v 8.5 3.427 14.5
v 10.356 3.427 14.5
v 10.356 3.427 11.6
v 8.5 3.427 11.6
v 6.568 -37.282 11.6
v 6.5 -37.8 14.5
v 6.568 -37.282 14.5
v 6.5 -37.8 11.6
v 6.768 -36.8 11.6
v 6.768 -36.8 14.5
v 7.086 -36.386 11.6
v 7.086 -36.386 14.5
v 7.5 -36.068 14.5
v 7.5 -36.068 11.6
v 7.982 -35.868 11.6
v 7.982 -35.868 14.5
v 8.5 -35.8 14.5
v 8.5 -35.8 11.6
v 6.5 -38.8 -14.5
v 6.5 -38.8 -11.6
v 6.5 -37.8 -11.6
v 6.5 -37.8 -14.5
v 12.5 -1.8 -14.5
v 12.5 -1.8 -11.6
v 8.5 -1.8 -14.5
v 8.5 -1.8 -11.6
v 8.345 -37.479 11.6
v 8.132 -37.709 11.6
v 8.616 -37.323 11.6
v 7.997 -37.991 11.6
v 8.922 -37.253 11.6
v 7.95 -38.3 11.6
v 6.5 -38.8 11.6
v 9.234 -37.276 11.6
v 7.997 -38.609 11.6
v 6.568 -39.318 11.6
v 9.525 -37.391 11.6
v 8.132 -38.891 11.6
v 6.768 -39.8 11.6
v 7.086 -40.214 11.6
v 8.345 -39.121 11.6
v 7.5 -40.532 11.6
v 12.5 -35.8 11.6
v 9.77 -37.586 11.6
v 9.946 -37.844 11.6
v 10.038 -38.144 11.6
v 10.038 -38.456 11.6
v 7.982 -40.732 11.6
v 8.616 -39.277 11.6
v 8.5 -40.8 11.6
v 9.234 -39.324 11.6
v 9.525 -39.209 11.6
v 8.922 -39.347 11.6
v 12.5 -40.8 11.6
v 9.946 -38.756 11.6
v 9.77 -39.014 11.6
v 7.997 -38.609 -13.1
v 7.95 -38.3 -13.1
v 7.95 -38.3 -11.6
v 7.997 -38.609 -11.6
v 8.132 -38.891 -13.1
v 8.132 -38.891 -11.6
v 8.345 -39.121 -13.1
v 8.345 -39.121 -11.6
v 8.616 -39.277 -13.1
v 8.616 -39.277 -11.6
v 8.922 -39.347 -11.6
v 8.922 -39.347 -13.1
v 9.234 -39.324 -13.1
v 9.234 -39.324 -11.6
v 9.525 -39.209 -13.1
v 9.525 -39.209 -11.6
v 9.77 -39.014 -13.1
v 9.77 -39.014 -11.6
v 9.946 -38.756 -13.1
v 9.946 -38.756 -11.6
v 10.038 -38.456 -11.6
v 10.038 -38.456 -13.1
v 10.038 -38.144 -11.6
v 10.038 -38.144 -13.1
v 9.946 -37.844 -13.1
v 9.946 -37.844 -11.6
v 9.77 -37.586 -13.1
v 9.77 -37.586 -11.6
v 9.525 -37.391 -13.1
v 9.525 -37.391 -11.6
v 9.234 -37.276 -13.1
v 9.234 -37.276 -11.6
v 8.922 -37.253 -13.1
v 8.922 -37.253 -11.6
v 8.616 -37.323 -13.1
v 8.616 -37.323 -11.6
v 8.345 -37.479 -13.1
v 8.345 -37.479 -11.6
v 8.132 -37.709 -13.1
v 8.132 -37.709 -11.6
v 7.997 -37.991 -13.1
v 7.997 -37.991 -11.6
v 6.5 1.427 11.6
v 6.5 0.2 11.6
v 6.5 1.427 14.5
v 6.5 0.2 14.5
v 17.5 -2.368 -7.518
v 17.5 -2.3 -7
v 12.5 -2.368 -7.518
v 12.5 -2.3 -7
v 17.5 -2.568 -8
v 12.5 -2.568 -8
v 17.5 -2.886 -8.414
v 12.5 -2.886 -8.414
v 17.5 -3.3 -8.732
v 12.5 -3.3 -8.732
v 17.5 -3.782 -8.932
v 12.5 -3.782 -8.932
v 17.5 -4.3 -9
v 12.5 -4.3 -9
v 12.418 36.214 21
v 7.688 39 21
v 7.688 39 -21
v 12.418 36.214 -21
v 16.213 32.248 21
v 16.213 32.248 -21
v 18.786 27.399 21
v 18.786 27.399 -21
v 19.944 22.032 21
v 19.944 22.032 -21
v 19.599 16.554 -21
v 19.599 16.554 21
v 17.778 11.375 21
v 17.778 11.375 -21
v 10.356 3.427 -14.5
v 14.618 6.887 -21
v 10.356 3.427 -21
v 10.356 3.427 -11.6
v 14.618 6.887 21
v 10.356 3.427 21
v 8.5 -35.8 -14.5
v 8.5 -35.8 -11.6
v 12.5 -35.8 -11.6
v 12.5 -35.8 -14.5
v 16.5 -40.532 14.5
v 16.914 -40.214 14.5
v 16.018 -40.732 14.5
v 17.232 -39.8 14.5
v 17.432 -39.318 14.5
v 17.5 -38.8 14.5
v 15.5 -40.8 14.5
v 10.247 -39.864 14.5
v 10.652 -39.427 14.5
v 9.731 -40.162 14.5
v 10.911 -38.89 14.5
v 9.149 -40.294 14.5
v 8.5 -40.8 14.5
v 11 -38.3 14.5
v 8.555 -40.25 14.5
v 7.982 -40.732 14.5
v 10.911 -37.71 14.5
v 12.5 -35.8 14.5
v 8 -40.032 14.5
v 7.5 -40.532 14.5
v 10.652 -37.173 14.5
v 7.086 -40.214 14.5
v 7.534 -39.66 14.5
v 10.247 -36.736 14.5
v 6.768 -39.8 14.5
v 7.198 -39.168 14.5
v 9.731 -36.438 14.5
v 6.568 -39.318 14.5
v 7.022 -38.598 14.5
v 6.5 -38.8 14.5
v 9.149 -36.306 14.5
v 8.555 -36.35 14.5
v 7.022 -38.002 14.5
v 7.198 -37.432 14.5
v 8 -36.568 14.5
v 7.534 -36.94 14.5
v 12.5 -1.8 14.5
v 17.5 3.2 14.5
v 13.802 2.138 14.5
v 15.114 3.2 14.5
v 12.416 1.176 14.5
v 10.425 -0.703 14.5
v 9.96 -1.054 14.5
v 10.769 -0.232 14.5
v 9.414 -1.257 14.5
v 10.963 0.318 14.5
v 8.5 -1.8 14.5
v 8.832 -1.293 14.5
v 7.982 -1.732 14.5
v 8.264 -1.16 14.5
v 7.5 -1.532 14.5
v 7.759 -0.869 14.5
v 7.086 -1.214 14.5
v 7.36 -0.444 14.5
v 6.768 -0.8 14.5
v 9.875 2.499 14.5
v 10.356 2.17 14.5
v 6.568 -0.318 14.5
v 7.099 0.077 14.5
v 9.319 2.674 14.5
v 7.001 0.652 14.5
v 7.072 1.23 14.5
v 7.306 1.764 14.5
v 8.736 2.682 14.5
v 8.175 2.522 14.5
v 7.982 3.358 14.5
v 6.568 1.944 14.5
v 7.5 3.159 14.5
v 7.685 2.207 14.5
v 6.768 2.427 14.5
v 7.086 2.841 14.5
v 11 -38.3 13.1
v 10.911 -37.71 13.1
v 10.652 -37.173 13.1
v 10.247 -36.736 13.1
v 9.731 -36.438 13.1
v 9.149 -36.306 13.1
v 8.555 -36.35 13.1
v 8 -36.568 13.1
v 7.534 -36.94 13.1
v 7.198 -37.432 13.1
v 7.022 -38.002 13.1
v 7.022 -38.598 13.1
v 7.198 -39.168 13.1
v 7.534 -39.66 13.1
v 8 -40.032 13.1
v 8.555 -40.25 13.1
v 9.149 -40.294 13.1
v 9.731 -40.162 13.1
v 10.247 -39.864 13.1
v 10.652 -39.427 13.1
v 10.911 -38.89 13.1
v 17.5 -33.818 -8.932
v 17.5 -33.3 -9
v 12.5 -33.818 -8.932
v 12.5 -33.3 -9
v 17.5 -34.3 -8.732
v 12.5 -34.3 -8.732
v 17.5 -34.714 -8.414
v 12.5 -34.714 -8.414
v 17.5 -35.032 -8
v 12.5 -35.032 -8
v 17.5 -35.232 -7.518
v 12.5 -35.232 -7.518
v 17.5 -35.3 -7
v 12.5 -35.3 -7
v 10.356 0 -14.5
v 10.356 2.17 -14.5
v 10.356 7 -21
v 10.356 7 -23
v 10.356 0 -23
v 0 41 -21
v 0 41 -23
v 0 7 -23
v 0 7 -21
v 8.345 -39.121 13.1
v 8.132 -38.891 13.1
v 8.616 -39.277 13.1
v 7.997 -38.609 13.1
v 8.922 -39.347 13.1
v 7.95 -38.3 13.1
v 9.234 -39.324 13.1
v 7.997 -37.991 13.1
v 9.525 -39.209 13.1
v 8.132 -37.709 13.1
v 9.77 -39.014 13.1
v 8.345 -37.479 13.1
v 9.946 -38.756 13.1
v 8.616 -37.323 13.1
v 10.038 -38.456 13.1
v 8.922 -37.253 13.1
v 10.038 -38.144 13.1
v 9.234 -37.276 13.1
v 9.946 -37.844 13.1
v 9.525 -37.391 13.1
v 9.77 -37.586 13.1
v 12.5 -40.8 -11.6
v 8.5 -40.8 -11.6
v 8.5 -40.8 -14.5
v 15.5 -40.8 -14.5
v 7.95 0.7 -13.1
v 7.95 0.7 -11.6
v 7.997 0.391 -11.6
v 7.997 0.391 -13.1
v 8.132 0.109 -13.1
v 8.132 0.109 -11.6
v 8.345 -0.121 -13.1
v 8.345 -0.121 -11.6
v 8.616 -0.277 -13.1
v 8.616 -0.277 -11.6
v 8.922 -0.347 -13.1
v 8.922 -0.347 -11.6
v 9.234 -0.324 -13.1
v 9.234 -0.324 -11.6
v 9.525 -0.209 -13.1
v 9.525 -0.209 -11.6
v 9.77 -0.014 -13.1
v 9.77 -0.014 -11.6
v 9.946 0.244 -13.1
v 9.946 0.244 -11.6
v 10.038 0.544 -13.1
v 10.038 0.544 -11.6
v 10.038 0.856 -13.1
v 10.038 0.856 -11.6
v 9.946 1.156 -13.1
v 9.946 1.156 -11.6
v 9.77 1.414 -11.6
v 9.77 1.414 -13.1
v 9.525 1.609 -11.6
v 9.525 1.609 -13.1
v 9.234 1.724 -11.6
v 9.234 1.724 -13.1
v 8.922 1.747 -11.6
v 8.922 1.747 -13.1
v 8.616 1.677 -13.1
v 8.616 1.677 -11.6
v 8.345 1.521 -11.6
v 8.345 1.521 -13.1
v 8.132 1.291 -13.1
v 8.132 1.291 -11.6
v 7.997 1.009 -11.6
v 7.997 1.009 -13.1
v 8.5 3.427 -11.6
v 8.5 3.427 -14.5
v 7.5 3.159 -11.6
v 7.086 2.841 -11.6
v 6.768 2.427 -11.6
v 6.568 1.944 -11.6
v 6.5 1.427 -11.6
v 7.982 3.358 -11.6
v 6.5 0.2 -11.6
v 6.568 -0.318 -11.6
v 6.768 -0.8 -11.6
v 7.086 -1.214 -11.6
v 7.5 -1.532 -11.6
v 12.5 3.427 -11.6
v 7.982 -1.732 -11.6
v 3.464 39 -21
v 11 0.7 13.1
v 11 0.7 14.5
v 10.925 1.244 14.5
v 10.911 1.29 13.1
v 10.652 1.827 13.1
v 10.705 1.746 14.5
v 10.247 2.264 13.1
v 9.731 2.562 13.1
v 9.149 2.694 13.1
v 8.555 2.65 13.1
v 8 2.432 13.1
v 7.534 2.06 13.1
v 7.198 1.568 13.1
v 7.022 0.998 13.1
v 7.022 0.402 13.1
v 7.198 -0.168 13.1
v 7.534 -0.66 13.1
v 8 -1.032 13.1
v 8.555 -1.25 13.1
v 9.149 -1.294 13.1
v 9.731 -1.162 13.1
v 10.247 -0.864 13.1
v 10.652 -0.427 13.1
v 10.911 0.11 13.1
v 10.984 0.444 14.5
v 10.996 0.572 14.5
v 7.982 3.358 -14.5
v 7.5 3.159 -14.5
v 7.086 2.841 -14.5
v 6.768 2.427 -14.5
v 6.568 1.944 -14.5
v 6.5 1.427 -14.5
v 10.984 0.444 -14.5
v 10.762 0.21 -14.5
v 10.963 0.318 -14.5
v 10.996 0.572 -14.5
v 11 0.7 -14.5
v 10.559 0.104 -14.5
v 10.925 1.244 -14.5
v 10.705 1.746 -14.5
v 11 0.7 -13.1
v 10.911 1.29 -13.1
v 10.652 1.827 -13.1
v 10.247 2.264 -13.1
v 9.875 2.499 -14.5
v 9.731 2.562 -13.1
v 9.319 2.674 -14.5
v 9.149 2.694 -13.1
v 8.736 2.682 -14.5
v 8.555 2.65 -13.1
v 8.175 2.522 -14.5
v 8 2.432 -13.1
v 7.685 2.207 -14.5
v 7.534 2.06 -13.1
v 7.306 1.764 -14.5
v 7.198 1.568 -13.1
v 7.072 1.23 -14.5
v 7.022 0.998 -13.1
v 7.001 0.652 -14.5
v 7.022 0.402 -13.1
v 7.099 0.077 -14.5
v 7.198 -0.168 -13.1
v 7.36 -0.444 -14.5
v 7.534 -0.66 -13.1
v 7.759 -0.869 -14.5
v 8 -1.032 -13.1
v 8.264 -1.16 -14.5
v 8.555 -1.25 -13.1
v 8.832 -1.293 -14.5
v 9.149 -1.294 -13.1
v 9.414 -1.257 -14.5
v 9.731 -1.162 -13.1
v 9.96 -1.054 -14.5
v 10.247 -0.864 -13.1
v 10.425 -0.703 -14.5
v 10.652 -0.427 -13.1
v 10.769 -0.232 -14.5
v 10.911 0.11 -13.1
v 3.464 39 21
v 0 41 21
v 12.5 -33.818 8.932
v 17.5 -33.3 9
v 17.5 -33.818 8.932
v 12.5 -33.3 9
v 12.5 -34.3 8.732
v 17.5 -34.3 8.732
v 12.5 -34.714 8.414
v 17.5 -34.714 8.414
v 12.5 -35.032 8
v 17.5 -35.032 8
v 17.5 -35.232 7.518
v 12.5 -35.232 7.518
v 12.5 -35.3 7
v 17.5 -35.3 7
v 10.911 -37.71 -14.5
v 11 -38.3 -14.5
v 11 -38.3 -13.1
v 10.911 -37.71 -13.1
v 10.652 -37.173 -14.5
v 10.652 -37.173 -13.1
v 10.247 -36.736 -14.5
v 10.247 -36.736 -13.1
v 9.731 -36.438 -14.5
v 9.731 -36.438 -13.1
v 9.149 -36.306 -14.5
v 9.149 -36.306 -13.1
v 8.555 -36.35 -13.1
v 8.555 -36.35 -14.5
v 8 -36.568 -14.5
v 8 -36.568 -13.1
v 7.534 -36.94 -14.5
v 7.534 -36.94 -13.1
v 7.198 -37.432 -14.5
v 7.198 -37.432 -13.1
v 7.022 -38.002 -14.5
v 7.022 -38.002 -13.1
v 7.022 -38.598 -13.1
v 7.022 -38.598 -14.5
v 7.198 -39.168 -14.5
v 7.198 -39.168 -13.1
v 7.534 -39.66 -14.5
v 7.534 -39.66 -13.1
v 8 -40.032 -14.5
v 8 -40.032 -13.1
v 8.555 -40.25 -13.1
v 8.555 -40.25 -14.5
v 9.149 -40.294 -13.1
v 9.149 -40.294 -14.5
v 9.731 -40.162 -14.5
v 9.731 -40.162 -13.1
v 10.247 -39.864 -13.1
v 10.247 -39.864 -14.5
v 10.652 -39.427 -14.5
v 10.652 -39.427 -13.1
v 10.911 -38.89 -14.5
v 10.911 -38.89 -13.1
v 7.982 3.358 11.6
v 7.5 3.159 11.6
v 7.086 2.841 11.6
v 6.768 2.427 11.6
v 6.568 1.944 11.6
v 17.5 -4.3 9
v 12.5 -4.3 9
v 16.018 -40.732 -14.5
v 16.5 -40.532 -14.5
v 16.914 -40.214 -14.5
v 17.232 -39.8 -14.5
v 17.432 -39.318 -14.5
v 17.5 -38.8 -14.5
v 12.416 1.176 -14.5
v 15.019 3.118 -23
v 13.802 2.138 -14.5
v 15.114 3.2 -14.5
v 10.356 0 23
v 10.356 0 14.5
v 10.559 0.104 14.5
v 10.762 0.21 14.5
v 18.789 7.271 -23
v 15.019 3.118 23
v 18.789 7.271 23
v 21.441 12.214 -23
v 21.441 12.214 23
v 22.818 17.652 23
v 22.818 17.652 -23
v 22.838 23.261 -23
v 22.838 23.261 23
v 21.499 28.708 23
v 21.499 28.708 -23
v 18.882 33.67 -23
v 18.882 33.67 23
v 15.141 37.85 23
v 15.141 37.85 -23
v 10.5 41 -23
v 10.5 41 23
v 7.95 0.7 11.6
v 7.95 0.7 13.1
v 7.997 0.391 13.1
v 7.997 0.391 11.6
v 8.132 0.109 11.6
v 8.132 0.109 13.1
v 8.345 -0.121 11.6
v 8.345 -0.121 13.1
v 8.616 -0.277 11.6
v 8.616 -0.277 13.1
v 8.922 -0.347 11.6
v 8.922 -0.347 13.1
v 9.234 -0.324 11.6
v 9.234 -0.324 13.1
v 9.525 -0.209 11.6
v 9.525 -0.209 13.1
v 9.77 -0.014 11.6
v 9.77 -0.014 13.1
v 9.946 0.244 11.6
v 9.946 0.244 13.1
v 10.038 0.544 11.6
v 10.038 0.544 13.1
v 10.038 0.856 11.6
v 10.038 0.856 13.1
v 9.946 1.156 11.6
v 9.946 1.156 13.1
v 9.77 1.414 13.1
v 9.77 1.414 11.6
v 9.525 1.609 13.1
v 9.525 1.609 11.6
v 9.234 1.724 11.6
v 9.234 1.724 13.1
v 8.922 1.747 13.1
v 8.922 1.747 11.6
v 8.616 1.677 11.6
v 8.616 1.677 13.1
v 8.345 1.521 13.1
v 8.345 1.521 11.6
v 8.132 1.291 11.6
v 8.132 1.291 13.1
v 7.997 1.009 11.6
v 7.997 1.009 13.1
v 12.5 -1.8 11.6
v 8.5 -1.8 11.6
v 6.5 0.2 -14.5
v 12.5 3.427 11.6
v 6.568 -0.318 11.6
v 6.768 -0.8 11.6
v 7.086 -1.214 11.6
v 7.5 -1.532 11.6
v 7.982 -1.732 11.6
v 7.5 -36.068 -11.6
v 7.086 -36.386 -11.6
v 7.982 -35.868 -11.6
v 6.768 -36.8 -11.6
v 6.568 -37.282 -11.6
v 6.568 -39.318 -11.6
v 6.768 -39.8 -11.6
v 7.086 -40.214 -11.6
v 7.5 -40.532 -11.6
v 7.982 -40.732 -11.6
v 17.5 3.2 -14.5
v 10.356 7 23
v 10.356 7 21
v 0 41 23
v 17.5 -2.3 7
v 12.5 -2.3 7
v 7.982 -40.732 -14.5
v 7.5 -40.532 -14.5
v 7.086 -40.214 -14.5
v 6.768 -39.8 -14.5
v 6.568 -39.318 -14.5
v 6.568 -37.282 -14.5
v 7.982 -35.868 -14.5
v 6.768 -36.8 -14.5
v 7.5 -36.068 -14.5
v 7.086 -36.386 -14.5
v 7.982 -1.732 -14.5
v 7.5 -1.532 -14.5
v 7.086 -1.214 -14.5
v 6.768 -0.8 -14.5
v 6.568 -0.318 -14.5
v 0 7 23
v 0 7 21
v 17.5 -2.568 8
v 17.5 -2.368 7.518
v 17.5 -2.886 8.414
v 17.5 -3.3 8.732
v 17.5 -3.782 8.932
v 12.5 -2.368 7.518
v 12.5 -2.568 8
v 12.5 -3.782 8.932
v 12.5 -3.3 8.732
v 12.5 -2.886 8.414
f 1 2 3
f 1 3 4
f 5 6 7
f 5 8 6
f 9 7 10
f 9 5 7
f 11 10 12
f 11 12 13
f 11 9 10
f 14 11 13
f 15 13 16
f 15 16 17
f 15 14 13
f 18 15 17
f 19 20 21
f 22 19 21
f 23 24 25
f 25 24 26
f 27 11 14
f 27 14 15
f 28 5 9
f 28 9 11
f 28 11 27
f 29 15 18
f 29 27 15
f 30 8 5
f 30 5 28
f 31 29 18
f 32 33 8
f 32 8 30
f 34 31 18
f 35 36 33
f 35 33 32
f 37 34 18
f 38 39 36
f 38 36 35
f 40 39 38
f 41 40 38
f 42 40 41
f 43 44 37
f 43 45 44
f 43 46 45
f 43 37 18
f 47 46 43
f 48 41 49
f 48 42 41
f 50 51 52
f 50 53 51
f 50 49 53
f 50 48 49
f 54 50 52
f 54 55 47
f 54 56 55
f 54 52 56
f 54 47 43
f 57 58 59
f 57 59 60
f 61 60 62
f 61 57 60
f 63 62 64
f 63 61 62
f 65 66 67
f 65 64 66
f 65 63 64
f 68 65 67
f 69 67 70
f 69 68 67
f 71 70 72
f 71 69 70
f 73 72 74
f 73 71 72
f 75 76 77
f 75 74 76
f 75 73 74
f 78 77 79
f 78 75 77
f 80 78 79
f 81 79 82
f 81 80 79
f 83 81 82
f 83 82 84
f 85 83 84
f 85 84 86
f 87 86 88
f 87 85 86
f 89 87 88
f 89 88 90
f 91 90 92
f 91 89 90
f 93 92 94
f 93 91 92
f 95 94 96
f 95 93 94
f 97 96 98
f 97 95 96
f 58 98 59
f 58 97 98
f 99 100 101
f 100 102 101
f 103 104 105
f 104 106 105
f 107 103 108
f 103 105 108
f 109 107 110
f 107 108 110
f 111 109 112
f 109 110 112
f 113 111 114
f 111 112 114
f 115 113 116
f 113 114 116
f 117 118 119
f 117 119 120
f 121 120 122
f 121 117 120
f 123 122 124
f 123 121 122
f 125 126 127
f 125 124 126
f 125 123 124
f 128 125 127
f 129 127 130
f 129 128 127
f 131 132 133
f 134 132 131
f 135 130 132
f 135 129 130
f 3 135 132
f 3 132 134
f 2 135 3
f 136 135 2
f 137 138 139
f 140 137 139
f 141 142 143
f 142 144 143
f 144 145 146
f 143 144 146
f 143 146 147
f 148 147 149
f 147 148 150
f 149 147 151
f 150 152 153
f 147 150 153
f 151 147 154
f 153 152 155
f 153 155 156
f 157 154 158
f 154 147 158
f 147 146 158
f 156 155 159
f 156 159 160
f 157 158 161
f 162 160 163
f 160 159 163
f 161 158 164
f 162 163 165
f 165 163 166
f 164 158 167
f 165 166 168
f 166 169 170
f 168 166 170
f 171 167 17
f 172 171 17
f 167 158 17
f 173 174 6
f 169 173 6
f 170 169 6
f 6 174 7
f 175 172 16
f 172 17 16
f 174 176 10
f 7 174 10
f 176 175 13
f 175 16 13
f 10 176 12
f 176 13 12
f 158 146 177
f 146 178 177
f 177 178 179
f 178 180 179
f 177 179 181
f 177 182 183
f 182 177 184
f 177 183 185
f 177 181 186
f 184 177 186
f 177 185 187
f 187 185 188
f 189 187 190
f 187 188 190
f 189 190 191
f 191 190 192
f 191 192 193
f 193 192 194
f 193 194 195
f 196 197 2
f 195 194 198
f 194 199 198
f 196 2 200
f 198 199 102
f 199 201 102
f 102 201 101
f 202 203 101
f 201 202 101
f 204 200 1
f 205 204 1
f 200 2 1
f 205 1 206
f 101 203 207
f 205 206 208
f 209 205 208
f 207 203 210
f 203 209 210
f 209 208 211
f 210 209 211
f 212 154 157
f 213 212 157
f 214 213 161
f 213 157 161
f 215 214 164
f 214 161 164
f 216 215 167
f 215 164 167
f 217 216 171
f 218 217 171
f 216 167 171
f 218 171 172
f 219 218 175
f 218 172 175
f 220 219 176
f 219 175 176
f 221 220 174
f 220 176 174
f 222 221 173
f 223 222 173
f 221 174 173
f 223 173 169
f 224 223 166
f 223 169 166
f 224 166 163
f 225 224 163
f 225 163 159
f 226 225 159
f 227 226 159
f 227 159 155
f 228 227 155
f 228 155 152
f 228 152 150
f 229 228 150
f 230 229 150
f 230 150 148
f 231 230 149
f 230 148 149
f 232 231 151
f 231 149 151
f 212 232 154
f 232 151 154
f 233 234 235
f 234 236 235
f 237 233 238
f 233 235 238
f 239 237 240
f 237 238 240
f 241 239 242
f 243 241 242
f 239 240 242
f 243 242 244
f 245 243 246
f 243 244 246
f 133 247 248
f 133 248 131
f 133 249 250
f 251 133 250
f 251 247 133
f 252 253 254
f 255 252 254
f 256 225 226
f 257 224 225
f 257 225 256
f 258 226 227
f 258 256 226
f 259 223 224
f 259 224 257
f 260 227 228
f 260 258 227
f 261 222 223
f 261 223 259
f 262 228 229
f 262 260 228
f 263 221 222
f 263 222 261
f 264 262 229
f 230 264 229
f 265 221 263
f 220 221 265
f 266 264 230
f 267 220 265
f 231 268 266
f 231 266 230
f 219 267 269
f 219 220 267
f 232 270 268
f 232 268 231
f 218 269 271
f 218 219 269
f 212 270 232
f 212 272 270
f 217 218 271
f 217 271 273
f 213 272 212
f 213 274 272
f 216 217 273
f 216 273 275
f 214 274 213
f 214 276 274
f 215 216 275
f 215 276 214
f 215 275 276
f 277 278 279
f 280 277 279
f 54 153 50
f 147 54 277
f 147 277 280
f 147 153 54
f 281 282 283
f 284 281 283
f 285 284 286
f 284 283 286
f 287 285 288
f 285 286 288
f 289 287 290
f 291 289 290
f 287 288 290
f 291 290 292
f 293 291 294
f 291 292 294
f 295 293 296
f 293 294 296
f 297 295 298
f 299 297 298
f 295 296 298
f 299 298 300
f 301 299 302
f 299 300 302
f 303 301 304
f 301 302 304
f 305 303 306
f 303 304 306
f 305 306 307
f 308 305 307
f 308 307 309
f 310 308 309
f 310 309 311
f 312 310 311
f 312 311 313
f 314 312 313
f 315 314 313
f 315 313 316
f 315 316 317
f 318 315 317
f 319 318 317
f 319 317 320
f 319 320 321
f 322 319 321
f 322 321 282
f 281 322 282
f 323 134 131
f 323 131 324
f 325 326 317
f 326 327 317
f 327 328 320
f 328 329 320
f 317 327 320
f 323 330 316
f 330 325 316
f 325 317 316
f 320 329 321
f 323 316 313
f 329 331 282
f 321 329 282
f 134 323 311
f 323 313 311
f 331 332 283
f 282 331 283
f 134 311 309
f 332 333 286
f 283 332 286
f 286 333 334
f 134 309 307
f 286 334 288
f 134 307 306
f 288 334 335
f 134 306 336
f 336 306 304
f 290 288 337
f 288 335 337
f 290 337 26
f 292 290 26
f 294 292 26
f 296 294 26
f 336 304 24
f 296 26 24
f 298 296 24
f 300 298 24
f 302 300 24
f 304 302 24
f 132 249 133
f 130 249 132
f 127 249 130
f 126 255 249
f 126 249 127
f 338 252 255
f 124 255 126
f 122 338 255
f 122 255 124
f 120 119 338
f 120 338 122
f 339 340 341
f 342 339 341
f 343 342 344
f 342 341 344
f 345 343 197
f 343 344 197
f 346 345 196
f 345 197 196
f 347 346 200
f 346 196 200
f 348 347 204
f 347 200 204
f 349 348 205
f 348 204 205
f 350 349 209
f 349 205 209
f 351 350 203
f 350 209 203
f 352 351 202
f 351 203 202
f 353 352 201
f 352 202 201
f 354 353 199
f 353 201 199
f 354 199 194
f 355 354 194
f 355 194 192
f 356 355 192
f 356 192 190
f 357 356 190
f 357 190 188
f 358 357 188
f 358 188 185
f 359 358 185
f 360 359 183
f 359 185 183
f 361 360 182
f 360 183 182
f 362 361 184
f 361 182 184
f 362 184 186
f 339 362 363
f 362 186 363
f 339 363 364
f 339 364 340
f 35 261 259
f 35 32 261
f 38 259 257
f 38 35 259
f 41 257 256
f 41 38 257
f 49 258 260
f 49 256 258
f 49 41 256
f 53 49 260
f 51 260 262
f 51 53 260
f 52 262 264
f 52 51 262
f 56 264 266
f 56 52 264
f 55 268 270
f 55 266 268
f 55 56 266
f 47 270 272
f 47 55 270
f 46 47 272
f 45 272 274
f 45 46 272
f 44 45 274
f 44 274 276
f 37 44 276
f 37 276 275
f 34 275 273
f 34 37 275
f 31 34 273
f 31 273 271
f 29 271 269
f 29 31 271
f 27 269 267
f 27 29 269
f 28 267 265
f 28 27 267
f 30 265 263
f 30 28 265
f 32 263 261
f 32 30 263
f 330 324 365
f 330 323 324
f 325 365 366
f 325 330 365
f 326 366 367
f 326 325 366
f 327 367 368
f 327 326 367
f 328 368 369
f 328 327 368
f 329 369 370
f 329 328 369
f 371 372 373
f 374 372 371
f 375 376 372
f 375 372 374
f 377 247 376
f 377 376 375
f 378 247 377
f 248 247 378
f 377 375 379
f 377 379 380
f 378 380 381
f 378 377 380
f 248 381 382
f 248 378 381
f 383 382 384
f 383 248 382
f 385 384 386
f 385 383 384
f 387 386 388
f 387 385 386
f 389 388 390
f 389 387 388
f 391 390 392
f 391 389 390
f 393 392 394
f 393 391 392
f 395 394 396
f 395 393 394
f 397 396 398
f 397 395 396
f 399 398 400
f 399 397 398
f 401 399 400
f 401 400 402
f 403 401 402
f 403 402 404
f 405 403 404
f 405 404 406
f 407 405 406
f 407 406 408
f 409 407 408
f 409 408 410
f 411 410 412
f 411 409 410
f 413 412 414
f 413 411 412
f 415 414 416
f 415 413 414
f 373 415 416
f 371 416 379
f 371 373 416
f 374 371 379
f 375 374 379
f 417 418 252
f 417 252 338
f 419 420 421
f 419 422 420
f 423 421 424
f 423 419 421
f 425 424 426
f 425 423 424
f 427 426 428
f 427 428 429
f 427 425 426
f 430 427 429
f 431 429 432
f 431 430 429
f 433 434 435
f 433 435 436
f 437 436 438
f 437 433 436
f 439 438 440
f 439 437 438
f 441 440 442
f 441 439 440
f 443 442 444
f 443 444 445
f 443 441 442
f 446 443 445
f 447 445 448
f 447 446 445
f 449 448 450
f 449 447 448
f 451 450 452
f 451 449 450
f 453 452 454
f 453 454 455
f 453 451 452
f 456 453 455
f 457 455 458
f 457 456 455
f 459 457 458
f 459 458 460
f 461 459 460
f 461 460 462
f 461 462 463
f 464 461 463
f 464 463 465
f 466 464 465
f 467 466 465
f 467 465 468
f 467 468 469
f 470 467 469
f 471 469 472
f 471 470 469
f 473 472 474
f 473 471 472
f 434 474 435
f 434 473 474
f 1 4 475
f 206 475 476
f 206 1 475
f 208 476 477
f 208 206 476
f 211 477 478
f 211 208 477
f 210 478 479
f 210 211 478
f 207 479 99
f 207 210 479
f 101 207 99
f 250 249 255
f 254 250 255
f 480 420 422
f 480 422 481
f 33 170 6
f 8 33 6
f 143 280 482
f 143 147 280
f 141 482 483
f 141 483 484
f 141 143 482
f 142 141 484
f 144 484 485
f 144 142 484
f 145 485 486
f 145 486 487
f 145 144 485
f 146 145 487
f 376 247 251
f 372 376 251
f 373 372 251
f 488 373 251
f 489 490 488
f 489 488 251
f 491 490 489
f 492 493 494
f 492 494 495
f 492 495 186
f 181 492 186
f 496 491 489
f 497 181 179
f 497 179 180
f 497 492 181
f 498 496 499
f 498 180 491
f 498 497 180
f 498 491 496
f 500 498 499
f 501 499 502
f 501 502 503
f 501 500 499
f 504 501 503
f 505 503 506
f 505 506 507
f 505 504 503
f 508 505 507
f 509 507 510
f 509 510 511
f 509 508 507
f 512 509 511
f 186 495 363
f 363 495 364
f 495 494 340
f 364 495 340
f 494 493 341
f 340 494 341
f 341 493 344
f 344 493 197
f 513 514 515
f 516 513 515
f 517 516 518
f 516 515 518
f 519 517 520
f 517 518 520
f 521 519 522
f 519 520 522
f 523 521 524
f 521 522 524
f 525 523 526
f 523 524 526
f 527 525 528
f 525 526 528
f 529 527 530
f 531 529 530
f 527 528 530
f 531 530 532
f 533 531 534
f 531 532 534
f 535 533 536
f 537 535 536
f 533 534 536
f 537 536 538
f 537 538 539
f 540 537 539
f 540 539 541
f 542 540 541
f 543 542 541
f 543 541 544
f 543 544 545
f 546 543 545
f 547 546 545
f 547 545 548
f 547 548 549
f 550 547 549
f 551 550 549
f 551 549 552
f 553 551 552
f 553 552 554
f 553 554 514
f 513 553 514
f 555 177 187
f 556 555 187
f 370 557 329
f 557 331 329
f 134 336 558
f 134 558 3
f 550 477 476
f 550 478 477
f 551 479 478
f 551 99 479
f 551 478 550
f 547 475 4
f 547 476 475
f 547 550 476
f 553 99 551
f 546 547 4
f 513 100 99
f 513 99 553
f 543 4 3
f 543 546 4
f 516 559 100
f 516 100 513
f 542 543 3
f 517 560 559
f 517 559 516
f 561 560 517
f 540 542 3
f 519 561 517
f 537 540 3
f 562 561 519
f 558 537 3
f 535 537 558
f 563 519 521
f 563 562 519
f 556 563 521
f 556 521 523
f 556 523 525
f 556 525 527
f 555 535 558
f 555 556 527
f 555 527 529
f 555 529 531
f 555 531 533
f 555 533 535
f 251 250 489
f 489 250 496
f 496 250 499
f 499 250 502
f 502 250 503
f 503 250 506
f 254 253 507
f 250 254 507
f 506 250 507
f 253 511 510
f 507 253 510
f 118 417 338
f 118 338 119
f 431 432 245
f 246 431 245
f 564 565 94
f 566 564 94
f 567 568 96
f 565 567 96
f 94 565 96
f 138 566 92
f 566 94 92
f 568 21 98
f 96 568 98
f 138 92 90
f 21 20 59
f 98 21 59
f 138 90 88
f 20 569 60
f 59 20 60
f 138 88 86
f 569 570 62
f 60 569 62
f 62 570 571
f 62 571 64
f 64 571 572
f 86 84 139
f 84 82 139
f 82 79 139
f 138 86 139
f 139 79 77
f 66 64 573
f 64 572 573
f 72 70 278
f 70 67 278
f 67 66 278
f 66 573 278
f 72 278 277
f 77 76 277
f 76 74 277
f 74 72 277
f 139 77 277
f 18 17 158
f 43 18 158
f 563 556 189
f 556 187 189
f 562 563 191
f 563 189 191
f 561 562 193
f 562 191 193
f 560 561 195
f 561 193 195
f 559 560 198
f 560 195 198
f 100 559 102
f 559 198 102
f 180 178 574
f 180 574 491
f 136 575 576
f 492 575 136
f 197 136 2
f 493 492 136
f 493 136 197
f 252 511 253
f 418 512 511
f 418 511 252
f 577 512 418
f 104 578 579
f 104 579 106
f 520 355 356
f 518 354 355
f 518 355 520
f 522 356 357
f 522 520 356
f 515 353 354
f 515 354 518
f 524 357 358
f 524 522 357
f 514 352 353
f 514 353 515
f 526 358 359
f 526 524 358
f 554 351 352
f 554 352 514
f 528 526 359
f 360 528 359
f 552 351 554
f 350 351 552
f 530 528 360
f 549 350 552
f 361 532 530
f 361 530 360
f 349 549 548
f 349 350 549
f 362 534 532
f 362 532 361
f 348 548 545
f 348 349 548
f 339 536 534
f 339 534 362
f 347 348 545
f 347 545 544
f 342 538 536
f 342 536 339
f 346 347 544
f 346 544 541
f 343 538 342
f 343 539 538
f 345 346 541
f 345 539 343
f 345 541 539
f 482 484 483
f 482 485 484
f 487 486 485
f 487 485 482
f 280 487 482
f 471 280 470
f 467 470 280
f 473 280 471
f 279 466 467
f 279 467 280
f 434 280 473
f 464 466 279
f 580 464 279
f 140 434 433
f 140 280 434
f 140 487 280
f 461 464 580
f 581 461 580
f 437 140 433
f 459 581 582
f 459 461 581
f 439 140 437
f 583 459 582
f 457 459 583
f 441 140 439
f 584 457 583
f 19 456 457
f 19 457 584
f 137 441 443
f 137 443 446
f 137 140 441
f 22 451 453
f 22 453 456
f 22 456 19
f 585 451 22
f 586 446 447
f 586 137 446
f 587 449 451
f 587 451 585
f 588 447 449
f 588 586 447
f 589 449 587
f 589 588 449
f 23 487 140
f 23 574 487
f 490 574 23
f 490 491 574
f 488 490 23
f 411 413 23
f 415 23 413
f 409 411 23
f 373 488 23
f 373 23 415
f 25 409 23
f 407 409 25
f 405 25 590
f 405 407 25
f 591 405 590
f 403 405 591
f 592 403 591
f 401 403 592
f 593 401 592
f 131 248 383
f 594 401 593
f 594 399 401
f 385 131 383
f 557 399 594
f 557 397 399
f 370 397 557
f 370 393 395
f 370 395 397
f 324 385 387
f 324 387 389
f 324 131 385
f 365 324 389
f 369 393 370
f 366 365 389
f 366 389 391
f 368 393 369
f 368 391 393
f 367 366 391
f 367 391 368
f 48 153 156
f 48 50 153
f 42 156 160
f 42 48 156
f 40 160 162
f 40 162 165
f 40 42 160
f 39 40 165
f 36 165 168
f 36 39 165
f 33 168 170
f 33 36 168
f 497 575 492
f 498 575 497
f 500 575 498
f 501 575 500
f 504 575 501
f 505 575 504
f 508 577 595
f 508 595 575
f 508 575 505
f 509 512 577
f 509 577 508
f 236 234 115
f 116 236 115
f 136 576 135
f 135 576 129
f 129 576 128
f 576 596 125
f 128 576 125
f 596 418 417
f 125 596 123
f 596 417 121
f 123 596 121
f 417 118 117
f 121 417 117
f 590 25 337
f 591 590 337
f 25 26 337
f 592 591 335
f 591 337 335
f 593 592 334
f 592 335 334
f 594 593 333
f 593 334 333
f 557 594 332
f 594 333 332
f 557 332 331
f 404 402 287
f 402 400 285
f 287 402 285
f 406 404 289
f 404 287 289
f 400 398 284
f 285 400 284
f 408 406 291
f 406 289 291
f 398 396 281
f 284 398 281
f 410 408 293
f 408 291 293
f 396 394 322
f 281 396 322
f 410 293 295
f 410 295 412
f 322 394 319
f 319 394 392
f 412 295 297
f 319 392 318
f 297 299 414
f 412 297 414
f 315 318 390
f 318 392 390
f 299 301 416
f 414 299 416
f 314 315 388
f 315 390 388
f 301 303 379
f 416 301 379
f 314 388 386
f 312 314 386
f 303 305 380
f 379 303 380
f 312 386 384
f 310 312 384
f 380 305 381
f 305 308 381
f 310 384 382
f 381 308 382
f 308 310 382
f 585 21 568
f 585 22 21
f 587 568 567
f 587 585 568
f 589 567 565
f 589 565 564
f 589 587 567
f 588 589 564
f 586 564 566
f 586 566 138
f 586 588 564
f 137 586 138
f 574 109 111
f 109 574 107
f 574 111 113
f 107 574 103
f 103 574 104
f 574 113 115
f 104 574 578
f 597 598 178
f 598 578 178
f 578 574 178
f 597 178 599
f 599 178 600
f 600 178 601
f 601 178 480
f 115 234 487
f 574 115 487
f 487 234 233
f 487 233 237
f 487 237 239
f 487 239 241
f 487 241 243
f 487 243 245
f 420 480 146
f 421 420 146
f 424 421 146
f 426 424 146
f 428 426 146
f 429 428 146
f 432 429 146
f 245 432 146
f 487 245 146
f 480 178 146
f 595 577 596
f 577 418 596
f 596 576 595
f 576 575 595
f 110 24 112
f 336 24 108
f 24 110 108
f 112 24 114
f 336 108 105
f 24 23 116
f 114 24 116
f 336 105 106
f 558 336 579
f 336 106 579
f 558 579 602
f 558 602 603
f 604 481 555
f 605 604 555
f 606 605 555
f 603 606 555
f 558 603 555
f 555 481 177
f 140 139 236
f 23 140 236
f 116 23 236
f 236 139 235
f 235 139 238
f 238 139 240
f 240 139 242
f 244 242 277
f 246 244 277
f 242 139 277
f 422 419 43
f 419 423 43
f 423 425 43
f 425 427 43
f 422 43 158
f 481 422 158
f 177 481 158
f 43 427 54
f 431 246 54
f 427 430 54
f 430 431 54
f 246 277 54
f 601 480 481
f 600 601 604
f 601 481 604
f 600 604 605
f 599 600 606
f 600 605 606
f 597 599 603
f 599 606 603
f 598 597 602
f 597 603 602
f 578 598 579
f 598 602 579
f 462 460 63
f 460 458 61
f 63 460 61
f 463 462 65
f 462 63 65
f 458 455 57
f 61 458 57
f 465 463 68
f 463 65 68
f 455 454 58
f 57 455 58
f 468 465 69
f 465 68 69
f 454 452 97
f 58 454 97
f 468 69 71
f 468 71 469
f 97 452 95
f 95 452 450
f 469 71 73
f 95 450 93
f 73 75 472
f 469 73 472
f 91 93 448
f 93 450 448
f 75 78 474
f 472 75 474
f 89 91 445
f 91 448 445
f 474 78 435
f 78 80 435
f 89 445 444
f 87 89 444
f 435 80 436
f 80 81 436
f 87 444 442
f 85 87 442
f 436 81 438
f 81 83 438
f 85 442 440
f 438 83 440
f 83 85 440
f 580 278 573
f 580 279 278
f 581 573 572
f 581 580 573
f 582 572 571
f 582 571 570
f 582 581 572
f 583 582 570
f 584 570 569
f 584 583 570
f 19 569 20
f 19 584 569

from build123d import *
from build123d.topology import SkipClean

# Parameters (mm, degrees)
BOSS_EXTRUDE1_DEPTH = 23
BOSS_EXTRUDE2_DEPTH = 2
SKETCH3_R           = 1.05
BOSS_EXTRUDE3_DEPTH = 14.5
CUT_EXTRUDE1_REACH  = 90.03
SKETCH4_W           = 17
SKETCH4_H           = 23.2
CUT_EXTRUDE2_DEPTH  = 7
SKETCH6_R           = 1.05
CUT_EXTRUDE3_DEPTH  = 61.135264197
SKETCH7_W           = 18
SKETCH7_H           = 33
CUT_EXTRUDE4_DEPTH  = 51.162236792
FILLET1_R           = 2
SKETCH8_R           = 2
CUT_EXTRUDE5_DEPTH  = 1.4


with BuildPart() as part:
    # Sketch1 → Boss-Extrude1 (new, symmetric)
    with BuildSketch(Plane.XY):
        with BuildLine():
            Line((0, 41), (3.464101615, 39))
            Line((3.464101615, 39), (7.687881875, 39))
            ThreePointArc((7.687881875, 39), (19.943980289, 22.03249582), (10.356028111, 3.42660107))
            Line((10.356028111, 3.42660107), (0, 3.42660107))
            Line((0, 3.42660107), (0, 0))
            Line((0, 0), (10.356028111, 0))
            ThreePointArc((10.356028111, 0), (22.999858198, 20.45585385), (10.5, 41))
            Line((10.5, 41), (0, 41))
        make_face()
    extrude(amount=BOSS_EXTRUDE1_DEPTH, both=True)

    # Sketch2 → Boss-Extrude2 (add)
    with BuildSketch(Plane.XY.offset(23)):
        with BuildLine():
            Line((0, 41), (0, 3.42660107))
            Line((0, 3.42660107), (10.356028111, 3.42660107))
            ThreePointArc((10.356028111, 3.42660107), (19.943980289, 22.03249582), (7.687881875, 39))
            Line((7.687881875, 39), (3.464101615, 39))
            Line((3.464101615, 39), (0, 41))
        make_face()
    boss_extrude2 = extrude(amount=-BOSS_EXTRUDE2_DEPTH)

    # Sketch3 → Boss-Extrude3 (add, symmetric)
    with BuildSketch(Plane.XY):
        Polygon((12.5, -40.8), (6.5, -40.8), (6.5, -35.8), (12.5, -35.8), (12.5, -1.8), (6.5, -1.8), (6.5, 3.2), (12.5, 3.2), (17.5, 3.2), (17.5, -40.8), align=None)
        with Locations((9, 0.7)):
            Circle(SKETCH3_R, mode=Mode.SUBTRACT)
        with Locations(Location((9, -38.3, 0), (0, 0, 180))):
            Circle(SKETCH3_R, mode=Mode.SUBTRACT)
    extrude(amount=BOSS_EXTRUDE3_DEPTH, both=True)

    # Mirror2: Boss-Extrude2 across plane
    add(boss_extrude2.mirror(Plane.XY))

    # Cut-Extrude1: up to this face of the body (flat: up to its plane)
    cut_extrude1_end = Plane(part.part.faces().sort_by_distance((5.178014055, 3.42660107, 0))[0])
    # Sketch4 → Cut-Extrude1 (cut, up to the picked face)
    with BuildSketch(Plane.XZ.offset(40.8), mode=Mode.PRIVATE) as cut_extrude1_sk1:
        with Locations((4, 0)):
            Rectangle(SKETCH4_W, SKETCH4_H)
    cut_extrude1_tool1 = split(extrude(cut_extrude1_sk1.sketch, amount=-CUT_EXTRUDE1_REACH, mode=Mode.PRIVATE), bisect_by=cut_extrude1_end, keep=Keep.BOTH, mode=Mode.PRIVATE)
    add(cut_extrude1_tool1.solids().sort_by(Axis((4, -40.8, 0), (0, 1, 0)))[0], mode=Mode.SUBTRACT)

    # Sketch5 → Cut-Extrude2 (cut)
    with BuildSketch(Plane.XZ):
        Polygon((0, -11.6), (6.5, -11.6), (6.5, -14.5), (10.356028111, -14.5), (10.356028111, -23), (0, -23), align=None)
        Polygon((6.5, 11.6), (0, 11.6), (0, 23), (10.356028111, 23), (10.356028111, 14.5), (6.5, 14.5), align=None)
    extrude(amount=-CUT_EXTRUDE2_DEPTH, mode=Mode.SUBTRACT)

    # Sketch6 → Cut-Extrude3 (cut, through all)
    with SkipClean():  # the faces are left unmerged after this step: merging them gives an invalid solid
        with BuildSketch(Plane.XY.offset(14.5)):
            with Locations(Location((9, 0.7, 0), (0, 0, 180))):
                Circle(SKETCH6_R)
        extrude(amount=-CUT_EXTRUDE3_DEPTH, mode=Mode.SUBTRACT)

    # Sketch7 → Cut-Extrude4 (cut, through all)
    with SkipClean():  # the faces are left unmerged after this step: merging them gives an invalid solid
        with BuildSketch(Plane(origin=(17.5, 0, 0), x_dir=(0, 0, -1), z_dir=(1, 0, 0))):
            with Locations((0, -18.8)):
                Rectangle(SKETCH7_W, SKETCH7_H)
        extrude(amount=-CUT_EXTRUDE4_DEPTH, mode=Mode.SUBTRACT)

    # Fillet1
    fillet1_edges = [part.edges().sort_by_distance(p)[0] for p in [
        (6.5, -40.8, -13.05),
        (6.5, -35.8, -13.05),
        (6.5, -1.8, -13.05),
        (6.5, 3.42660107, -13.05),
        (6.5, 3.42660107, 13.05),
        (15, -35.3, -9),
        (15, -35.3, 9),
        (15, -2.3, 9),
        (15, -2.3, -9),
        (17.5, -40.8, 0),
        (6.5, -1.8, 13.05),
        (6.5, -35.8, 13.05),
        (6.5, -40.8, 13.05),
    ]]
    fillet(fillet1_edges, radius=FILLET1_R)

    # Sketch8 → Cut-Extrude5 (cut)
    with SkipClean():  # the faces are left unmerged after this step: merging them gives an invalid solid
        with BuildSketch(Plane.XY.offset(14.5)):
            with Locations((9, 0.7)):
                Circle(SKETCH8_R)
            with Locations((9, -38.3)):
                Circle(SKETCH8_R)
        cut_extrude5 = extrude(amount=-CUT_EXTRUDE5_DEPTH, mode=Mode.SUBTRACT)

    # Mirror3: Cut-Extrude5 across plane
    with SkipClean():  # the faces are left unmerged after this step: merging them gives an invalid solid
        add(cut_extrude5.mirror(Plane.XY), mode=Mode.SUBTRACT)


solid = part.part
